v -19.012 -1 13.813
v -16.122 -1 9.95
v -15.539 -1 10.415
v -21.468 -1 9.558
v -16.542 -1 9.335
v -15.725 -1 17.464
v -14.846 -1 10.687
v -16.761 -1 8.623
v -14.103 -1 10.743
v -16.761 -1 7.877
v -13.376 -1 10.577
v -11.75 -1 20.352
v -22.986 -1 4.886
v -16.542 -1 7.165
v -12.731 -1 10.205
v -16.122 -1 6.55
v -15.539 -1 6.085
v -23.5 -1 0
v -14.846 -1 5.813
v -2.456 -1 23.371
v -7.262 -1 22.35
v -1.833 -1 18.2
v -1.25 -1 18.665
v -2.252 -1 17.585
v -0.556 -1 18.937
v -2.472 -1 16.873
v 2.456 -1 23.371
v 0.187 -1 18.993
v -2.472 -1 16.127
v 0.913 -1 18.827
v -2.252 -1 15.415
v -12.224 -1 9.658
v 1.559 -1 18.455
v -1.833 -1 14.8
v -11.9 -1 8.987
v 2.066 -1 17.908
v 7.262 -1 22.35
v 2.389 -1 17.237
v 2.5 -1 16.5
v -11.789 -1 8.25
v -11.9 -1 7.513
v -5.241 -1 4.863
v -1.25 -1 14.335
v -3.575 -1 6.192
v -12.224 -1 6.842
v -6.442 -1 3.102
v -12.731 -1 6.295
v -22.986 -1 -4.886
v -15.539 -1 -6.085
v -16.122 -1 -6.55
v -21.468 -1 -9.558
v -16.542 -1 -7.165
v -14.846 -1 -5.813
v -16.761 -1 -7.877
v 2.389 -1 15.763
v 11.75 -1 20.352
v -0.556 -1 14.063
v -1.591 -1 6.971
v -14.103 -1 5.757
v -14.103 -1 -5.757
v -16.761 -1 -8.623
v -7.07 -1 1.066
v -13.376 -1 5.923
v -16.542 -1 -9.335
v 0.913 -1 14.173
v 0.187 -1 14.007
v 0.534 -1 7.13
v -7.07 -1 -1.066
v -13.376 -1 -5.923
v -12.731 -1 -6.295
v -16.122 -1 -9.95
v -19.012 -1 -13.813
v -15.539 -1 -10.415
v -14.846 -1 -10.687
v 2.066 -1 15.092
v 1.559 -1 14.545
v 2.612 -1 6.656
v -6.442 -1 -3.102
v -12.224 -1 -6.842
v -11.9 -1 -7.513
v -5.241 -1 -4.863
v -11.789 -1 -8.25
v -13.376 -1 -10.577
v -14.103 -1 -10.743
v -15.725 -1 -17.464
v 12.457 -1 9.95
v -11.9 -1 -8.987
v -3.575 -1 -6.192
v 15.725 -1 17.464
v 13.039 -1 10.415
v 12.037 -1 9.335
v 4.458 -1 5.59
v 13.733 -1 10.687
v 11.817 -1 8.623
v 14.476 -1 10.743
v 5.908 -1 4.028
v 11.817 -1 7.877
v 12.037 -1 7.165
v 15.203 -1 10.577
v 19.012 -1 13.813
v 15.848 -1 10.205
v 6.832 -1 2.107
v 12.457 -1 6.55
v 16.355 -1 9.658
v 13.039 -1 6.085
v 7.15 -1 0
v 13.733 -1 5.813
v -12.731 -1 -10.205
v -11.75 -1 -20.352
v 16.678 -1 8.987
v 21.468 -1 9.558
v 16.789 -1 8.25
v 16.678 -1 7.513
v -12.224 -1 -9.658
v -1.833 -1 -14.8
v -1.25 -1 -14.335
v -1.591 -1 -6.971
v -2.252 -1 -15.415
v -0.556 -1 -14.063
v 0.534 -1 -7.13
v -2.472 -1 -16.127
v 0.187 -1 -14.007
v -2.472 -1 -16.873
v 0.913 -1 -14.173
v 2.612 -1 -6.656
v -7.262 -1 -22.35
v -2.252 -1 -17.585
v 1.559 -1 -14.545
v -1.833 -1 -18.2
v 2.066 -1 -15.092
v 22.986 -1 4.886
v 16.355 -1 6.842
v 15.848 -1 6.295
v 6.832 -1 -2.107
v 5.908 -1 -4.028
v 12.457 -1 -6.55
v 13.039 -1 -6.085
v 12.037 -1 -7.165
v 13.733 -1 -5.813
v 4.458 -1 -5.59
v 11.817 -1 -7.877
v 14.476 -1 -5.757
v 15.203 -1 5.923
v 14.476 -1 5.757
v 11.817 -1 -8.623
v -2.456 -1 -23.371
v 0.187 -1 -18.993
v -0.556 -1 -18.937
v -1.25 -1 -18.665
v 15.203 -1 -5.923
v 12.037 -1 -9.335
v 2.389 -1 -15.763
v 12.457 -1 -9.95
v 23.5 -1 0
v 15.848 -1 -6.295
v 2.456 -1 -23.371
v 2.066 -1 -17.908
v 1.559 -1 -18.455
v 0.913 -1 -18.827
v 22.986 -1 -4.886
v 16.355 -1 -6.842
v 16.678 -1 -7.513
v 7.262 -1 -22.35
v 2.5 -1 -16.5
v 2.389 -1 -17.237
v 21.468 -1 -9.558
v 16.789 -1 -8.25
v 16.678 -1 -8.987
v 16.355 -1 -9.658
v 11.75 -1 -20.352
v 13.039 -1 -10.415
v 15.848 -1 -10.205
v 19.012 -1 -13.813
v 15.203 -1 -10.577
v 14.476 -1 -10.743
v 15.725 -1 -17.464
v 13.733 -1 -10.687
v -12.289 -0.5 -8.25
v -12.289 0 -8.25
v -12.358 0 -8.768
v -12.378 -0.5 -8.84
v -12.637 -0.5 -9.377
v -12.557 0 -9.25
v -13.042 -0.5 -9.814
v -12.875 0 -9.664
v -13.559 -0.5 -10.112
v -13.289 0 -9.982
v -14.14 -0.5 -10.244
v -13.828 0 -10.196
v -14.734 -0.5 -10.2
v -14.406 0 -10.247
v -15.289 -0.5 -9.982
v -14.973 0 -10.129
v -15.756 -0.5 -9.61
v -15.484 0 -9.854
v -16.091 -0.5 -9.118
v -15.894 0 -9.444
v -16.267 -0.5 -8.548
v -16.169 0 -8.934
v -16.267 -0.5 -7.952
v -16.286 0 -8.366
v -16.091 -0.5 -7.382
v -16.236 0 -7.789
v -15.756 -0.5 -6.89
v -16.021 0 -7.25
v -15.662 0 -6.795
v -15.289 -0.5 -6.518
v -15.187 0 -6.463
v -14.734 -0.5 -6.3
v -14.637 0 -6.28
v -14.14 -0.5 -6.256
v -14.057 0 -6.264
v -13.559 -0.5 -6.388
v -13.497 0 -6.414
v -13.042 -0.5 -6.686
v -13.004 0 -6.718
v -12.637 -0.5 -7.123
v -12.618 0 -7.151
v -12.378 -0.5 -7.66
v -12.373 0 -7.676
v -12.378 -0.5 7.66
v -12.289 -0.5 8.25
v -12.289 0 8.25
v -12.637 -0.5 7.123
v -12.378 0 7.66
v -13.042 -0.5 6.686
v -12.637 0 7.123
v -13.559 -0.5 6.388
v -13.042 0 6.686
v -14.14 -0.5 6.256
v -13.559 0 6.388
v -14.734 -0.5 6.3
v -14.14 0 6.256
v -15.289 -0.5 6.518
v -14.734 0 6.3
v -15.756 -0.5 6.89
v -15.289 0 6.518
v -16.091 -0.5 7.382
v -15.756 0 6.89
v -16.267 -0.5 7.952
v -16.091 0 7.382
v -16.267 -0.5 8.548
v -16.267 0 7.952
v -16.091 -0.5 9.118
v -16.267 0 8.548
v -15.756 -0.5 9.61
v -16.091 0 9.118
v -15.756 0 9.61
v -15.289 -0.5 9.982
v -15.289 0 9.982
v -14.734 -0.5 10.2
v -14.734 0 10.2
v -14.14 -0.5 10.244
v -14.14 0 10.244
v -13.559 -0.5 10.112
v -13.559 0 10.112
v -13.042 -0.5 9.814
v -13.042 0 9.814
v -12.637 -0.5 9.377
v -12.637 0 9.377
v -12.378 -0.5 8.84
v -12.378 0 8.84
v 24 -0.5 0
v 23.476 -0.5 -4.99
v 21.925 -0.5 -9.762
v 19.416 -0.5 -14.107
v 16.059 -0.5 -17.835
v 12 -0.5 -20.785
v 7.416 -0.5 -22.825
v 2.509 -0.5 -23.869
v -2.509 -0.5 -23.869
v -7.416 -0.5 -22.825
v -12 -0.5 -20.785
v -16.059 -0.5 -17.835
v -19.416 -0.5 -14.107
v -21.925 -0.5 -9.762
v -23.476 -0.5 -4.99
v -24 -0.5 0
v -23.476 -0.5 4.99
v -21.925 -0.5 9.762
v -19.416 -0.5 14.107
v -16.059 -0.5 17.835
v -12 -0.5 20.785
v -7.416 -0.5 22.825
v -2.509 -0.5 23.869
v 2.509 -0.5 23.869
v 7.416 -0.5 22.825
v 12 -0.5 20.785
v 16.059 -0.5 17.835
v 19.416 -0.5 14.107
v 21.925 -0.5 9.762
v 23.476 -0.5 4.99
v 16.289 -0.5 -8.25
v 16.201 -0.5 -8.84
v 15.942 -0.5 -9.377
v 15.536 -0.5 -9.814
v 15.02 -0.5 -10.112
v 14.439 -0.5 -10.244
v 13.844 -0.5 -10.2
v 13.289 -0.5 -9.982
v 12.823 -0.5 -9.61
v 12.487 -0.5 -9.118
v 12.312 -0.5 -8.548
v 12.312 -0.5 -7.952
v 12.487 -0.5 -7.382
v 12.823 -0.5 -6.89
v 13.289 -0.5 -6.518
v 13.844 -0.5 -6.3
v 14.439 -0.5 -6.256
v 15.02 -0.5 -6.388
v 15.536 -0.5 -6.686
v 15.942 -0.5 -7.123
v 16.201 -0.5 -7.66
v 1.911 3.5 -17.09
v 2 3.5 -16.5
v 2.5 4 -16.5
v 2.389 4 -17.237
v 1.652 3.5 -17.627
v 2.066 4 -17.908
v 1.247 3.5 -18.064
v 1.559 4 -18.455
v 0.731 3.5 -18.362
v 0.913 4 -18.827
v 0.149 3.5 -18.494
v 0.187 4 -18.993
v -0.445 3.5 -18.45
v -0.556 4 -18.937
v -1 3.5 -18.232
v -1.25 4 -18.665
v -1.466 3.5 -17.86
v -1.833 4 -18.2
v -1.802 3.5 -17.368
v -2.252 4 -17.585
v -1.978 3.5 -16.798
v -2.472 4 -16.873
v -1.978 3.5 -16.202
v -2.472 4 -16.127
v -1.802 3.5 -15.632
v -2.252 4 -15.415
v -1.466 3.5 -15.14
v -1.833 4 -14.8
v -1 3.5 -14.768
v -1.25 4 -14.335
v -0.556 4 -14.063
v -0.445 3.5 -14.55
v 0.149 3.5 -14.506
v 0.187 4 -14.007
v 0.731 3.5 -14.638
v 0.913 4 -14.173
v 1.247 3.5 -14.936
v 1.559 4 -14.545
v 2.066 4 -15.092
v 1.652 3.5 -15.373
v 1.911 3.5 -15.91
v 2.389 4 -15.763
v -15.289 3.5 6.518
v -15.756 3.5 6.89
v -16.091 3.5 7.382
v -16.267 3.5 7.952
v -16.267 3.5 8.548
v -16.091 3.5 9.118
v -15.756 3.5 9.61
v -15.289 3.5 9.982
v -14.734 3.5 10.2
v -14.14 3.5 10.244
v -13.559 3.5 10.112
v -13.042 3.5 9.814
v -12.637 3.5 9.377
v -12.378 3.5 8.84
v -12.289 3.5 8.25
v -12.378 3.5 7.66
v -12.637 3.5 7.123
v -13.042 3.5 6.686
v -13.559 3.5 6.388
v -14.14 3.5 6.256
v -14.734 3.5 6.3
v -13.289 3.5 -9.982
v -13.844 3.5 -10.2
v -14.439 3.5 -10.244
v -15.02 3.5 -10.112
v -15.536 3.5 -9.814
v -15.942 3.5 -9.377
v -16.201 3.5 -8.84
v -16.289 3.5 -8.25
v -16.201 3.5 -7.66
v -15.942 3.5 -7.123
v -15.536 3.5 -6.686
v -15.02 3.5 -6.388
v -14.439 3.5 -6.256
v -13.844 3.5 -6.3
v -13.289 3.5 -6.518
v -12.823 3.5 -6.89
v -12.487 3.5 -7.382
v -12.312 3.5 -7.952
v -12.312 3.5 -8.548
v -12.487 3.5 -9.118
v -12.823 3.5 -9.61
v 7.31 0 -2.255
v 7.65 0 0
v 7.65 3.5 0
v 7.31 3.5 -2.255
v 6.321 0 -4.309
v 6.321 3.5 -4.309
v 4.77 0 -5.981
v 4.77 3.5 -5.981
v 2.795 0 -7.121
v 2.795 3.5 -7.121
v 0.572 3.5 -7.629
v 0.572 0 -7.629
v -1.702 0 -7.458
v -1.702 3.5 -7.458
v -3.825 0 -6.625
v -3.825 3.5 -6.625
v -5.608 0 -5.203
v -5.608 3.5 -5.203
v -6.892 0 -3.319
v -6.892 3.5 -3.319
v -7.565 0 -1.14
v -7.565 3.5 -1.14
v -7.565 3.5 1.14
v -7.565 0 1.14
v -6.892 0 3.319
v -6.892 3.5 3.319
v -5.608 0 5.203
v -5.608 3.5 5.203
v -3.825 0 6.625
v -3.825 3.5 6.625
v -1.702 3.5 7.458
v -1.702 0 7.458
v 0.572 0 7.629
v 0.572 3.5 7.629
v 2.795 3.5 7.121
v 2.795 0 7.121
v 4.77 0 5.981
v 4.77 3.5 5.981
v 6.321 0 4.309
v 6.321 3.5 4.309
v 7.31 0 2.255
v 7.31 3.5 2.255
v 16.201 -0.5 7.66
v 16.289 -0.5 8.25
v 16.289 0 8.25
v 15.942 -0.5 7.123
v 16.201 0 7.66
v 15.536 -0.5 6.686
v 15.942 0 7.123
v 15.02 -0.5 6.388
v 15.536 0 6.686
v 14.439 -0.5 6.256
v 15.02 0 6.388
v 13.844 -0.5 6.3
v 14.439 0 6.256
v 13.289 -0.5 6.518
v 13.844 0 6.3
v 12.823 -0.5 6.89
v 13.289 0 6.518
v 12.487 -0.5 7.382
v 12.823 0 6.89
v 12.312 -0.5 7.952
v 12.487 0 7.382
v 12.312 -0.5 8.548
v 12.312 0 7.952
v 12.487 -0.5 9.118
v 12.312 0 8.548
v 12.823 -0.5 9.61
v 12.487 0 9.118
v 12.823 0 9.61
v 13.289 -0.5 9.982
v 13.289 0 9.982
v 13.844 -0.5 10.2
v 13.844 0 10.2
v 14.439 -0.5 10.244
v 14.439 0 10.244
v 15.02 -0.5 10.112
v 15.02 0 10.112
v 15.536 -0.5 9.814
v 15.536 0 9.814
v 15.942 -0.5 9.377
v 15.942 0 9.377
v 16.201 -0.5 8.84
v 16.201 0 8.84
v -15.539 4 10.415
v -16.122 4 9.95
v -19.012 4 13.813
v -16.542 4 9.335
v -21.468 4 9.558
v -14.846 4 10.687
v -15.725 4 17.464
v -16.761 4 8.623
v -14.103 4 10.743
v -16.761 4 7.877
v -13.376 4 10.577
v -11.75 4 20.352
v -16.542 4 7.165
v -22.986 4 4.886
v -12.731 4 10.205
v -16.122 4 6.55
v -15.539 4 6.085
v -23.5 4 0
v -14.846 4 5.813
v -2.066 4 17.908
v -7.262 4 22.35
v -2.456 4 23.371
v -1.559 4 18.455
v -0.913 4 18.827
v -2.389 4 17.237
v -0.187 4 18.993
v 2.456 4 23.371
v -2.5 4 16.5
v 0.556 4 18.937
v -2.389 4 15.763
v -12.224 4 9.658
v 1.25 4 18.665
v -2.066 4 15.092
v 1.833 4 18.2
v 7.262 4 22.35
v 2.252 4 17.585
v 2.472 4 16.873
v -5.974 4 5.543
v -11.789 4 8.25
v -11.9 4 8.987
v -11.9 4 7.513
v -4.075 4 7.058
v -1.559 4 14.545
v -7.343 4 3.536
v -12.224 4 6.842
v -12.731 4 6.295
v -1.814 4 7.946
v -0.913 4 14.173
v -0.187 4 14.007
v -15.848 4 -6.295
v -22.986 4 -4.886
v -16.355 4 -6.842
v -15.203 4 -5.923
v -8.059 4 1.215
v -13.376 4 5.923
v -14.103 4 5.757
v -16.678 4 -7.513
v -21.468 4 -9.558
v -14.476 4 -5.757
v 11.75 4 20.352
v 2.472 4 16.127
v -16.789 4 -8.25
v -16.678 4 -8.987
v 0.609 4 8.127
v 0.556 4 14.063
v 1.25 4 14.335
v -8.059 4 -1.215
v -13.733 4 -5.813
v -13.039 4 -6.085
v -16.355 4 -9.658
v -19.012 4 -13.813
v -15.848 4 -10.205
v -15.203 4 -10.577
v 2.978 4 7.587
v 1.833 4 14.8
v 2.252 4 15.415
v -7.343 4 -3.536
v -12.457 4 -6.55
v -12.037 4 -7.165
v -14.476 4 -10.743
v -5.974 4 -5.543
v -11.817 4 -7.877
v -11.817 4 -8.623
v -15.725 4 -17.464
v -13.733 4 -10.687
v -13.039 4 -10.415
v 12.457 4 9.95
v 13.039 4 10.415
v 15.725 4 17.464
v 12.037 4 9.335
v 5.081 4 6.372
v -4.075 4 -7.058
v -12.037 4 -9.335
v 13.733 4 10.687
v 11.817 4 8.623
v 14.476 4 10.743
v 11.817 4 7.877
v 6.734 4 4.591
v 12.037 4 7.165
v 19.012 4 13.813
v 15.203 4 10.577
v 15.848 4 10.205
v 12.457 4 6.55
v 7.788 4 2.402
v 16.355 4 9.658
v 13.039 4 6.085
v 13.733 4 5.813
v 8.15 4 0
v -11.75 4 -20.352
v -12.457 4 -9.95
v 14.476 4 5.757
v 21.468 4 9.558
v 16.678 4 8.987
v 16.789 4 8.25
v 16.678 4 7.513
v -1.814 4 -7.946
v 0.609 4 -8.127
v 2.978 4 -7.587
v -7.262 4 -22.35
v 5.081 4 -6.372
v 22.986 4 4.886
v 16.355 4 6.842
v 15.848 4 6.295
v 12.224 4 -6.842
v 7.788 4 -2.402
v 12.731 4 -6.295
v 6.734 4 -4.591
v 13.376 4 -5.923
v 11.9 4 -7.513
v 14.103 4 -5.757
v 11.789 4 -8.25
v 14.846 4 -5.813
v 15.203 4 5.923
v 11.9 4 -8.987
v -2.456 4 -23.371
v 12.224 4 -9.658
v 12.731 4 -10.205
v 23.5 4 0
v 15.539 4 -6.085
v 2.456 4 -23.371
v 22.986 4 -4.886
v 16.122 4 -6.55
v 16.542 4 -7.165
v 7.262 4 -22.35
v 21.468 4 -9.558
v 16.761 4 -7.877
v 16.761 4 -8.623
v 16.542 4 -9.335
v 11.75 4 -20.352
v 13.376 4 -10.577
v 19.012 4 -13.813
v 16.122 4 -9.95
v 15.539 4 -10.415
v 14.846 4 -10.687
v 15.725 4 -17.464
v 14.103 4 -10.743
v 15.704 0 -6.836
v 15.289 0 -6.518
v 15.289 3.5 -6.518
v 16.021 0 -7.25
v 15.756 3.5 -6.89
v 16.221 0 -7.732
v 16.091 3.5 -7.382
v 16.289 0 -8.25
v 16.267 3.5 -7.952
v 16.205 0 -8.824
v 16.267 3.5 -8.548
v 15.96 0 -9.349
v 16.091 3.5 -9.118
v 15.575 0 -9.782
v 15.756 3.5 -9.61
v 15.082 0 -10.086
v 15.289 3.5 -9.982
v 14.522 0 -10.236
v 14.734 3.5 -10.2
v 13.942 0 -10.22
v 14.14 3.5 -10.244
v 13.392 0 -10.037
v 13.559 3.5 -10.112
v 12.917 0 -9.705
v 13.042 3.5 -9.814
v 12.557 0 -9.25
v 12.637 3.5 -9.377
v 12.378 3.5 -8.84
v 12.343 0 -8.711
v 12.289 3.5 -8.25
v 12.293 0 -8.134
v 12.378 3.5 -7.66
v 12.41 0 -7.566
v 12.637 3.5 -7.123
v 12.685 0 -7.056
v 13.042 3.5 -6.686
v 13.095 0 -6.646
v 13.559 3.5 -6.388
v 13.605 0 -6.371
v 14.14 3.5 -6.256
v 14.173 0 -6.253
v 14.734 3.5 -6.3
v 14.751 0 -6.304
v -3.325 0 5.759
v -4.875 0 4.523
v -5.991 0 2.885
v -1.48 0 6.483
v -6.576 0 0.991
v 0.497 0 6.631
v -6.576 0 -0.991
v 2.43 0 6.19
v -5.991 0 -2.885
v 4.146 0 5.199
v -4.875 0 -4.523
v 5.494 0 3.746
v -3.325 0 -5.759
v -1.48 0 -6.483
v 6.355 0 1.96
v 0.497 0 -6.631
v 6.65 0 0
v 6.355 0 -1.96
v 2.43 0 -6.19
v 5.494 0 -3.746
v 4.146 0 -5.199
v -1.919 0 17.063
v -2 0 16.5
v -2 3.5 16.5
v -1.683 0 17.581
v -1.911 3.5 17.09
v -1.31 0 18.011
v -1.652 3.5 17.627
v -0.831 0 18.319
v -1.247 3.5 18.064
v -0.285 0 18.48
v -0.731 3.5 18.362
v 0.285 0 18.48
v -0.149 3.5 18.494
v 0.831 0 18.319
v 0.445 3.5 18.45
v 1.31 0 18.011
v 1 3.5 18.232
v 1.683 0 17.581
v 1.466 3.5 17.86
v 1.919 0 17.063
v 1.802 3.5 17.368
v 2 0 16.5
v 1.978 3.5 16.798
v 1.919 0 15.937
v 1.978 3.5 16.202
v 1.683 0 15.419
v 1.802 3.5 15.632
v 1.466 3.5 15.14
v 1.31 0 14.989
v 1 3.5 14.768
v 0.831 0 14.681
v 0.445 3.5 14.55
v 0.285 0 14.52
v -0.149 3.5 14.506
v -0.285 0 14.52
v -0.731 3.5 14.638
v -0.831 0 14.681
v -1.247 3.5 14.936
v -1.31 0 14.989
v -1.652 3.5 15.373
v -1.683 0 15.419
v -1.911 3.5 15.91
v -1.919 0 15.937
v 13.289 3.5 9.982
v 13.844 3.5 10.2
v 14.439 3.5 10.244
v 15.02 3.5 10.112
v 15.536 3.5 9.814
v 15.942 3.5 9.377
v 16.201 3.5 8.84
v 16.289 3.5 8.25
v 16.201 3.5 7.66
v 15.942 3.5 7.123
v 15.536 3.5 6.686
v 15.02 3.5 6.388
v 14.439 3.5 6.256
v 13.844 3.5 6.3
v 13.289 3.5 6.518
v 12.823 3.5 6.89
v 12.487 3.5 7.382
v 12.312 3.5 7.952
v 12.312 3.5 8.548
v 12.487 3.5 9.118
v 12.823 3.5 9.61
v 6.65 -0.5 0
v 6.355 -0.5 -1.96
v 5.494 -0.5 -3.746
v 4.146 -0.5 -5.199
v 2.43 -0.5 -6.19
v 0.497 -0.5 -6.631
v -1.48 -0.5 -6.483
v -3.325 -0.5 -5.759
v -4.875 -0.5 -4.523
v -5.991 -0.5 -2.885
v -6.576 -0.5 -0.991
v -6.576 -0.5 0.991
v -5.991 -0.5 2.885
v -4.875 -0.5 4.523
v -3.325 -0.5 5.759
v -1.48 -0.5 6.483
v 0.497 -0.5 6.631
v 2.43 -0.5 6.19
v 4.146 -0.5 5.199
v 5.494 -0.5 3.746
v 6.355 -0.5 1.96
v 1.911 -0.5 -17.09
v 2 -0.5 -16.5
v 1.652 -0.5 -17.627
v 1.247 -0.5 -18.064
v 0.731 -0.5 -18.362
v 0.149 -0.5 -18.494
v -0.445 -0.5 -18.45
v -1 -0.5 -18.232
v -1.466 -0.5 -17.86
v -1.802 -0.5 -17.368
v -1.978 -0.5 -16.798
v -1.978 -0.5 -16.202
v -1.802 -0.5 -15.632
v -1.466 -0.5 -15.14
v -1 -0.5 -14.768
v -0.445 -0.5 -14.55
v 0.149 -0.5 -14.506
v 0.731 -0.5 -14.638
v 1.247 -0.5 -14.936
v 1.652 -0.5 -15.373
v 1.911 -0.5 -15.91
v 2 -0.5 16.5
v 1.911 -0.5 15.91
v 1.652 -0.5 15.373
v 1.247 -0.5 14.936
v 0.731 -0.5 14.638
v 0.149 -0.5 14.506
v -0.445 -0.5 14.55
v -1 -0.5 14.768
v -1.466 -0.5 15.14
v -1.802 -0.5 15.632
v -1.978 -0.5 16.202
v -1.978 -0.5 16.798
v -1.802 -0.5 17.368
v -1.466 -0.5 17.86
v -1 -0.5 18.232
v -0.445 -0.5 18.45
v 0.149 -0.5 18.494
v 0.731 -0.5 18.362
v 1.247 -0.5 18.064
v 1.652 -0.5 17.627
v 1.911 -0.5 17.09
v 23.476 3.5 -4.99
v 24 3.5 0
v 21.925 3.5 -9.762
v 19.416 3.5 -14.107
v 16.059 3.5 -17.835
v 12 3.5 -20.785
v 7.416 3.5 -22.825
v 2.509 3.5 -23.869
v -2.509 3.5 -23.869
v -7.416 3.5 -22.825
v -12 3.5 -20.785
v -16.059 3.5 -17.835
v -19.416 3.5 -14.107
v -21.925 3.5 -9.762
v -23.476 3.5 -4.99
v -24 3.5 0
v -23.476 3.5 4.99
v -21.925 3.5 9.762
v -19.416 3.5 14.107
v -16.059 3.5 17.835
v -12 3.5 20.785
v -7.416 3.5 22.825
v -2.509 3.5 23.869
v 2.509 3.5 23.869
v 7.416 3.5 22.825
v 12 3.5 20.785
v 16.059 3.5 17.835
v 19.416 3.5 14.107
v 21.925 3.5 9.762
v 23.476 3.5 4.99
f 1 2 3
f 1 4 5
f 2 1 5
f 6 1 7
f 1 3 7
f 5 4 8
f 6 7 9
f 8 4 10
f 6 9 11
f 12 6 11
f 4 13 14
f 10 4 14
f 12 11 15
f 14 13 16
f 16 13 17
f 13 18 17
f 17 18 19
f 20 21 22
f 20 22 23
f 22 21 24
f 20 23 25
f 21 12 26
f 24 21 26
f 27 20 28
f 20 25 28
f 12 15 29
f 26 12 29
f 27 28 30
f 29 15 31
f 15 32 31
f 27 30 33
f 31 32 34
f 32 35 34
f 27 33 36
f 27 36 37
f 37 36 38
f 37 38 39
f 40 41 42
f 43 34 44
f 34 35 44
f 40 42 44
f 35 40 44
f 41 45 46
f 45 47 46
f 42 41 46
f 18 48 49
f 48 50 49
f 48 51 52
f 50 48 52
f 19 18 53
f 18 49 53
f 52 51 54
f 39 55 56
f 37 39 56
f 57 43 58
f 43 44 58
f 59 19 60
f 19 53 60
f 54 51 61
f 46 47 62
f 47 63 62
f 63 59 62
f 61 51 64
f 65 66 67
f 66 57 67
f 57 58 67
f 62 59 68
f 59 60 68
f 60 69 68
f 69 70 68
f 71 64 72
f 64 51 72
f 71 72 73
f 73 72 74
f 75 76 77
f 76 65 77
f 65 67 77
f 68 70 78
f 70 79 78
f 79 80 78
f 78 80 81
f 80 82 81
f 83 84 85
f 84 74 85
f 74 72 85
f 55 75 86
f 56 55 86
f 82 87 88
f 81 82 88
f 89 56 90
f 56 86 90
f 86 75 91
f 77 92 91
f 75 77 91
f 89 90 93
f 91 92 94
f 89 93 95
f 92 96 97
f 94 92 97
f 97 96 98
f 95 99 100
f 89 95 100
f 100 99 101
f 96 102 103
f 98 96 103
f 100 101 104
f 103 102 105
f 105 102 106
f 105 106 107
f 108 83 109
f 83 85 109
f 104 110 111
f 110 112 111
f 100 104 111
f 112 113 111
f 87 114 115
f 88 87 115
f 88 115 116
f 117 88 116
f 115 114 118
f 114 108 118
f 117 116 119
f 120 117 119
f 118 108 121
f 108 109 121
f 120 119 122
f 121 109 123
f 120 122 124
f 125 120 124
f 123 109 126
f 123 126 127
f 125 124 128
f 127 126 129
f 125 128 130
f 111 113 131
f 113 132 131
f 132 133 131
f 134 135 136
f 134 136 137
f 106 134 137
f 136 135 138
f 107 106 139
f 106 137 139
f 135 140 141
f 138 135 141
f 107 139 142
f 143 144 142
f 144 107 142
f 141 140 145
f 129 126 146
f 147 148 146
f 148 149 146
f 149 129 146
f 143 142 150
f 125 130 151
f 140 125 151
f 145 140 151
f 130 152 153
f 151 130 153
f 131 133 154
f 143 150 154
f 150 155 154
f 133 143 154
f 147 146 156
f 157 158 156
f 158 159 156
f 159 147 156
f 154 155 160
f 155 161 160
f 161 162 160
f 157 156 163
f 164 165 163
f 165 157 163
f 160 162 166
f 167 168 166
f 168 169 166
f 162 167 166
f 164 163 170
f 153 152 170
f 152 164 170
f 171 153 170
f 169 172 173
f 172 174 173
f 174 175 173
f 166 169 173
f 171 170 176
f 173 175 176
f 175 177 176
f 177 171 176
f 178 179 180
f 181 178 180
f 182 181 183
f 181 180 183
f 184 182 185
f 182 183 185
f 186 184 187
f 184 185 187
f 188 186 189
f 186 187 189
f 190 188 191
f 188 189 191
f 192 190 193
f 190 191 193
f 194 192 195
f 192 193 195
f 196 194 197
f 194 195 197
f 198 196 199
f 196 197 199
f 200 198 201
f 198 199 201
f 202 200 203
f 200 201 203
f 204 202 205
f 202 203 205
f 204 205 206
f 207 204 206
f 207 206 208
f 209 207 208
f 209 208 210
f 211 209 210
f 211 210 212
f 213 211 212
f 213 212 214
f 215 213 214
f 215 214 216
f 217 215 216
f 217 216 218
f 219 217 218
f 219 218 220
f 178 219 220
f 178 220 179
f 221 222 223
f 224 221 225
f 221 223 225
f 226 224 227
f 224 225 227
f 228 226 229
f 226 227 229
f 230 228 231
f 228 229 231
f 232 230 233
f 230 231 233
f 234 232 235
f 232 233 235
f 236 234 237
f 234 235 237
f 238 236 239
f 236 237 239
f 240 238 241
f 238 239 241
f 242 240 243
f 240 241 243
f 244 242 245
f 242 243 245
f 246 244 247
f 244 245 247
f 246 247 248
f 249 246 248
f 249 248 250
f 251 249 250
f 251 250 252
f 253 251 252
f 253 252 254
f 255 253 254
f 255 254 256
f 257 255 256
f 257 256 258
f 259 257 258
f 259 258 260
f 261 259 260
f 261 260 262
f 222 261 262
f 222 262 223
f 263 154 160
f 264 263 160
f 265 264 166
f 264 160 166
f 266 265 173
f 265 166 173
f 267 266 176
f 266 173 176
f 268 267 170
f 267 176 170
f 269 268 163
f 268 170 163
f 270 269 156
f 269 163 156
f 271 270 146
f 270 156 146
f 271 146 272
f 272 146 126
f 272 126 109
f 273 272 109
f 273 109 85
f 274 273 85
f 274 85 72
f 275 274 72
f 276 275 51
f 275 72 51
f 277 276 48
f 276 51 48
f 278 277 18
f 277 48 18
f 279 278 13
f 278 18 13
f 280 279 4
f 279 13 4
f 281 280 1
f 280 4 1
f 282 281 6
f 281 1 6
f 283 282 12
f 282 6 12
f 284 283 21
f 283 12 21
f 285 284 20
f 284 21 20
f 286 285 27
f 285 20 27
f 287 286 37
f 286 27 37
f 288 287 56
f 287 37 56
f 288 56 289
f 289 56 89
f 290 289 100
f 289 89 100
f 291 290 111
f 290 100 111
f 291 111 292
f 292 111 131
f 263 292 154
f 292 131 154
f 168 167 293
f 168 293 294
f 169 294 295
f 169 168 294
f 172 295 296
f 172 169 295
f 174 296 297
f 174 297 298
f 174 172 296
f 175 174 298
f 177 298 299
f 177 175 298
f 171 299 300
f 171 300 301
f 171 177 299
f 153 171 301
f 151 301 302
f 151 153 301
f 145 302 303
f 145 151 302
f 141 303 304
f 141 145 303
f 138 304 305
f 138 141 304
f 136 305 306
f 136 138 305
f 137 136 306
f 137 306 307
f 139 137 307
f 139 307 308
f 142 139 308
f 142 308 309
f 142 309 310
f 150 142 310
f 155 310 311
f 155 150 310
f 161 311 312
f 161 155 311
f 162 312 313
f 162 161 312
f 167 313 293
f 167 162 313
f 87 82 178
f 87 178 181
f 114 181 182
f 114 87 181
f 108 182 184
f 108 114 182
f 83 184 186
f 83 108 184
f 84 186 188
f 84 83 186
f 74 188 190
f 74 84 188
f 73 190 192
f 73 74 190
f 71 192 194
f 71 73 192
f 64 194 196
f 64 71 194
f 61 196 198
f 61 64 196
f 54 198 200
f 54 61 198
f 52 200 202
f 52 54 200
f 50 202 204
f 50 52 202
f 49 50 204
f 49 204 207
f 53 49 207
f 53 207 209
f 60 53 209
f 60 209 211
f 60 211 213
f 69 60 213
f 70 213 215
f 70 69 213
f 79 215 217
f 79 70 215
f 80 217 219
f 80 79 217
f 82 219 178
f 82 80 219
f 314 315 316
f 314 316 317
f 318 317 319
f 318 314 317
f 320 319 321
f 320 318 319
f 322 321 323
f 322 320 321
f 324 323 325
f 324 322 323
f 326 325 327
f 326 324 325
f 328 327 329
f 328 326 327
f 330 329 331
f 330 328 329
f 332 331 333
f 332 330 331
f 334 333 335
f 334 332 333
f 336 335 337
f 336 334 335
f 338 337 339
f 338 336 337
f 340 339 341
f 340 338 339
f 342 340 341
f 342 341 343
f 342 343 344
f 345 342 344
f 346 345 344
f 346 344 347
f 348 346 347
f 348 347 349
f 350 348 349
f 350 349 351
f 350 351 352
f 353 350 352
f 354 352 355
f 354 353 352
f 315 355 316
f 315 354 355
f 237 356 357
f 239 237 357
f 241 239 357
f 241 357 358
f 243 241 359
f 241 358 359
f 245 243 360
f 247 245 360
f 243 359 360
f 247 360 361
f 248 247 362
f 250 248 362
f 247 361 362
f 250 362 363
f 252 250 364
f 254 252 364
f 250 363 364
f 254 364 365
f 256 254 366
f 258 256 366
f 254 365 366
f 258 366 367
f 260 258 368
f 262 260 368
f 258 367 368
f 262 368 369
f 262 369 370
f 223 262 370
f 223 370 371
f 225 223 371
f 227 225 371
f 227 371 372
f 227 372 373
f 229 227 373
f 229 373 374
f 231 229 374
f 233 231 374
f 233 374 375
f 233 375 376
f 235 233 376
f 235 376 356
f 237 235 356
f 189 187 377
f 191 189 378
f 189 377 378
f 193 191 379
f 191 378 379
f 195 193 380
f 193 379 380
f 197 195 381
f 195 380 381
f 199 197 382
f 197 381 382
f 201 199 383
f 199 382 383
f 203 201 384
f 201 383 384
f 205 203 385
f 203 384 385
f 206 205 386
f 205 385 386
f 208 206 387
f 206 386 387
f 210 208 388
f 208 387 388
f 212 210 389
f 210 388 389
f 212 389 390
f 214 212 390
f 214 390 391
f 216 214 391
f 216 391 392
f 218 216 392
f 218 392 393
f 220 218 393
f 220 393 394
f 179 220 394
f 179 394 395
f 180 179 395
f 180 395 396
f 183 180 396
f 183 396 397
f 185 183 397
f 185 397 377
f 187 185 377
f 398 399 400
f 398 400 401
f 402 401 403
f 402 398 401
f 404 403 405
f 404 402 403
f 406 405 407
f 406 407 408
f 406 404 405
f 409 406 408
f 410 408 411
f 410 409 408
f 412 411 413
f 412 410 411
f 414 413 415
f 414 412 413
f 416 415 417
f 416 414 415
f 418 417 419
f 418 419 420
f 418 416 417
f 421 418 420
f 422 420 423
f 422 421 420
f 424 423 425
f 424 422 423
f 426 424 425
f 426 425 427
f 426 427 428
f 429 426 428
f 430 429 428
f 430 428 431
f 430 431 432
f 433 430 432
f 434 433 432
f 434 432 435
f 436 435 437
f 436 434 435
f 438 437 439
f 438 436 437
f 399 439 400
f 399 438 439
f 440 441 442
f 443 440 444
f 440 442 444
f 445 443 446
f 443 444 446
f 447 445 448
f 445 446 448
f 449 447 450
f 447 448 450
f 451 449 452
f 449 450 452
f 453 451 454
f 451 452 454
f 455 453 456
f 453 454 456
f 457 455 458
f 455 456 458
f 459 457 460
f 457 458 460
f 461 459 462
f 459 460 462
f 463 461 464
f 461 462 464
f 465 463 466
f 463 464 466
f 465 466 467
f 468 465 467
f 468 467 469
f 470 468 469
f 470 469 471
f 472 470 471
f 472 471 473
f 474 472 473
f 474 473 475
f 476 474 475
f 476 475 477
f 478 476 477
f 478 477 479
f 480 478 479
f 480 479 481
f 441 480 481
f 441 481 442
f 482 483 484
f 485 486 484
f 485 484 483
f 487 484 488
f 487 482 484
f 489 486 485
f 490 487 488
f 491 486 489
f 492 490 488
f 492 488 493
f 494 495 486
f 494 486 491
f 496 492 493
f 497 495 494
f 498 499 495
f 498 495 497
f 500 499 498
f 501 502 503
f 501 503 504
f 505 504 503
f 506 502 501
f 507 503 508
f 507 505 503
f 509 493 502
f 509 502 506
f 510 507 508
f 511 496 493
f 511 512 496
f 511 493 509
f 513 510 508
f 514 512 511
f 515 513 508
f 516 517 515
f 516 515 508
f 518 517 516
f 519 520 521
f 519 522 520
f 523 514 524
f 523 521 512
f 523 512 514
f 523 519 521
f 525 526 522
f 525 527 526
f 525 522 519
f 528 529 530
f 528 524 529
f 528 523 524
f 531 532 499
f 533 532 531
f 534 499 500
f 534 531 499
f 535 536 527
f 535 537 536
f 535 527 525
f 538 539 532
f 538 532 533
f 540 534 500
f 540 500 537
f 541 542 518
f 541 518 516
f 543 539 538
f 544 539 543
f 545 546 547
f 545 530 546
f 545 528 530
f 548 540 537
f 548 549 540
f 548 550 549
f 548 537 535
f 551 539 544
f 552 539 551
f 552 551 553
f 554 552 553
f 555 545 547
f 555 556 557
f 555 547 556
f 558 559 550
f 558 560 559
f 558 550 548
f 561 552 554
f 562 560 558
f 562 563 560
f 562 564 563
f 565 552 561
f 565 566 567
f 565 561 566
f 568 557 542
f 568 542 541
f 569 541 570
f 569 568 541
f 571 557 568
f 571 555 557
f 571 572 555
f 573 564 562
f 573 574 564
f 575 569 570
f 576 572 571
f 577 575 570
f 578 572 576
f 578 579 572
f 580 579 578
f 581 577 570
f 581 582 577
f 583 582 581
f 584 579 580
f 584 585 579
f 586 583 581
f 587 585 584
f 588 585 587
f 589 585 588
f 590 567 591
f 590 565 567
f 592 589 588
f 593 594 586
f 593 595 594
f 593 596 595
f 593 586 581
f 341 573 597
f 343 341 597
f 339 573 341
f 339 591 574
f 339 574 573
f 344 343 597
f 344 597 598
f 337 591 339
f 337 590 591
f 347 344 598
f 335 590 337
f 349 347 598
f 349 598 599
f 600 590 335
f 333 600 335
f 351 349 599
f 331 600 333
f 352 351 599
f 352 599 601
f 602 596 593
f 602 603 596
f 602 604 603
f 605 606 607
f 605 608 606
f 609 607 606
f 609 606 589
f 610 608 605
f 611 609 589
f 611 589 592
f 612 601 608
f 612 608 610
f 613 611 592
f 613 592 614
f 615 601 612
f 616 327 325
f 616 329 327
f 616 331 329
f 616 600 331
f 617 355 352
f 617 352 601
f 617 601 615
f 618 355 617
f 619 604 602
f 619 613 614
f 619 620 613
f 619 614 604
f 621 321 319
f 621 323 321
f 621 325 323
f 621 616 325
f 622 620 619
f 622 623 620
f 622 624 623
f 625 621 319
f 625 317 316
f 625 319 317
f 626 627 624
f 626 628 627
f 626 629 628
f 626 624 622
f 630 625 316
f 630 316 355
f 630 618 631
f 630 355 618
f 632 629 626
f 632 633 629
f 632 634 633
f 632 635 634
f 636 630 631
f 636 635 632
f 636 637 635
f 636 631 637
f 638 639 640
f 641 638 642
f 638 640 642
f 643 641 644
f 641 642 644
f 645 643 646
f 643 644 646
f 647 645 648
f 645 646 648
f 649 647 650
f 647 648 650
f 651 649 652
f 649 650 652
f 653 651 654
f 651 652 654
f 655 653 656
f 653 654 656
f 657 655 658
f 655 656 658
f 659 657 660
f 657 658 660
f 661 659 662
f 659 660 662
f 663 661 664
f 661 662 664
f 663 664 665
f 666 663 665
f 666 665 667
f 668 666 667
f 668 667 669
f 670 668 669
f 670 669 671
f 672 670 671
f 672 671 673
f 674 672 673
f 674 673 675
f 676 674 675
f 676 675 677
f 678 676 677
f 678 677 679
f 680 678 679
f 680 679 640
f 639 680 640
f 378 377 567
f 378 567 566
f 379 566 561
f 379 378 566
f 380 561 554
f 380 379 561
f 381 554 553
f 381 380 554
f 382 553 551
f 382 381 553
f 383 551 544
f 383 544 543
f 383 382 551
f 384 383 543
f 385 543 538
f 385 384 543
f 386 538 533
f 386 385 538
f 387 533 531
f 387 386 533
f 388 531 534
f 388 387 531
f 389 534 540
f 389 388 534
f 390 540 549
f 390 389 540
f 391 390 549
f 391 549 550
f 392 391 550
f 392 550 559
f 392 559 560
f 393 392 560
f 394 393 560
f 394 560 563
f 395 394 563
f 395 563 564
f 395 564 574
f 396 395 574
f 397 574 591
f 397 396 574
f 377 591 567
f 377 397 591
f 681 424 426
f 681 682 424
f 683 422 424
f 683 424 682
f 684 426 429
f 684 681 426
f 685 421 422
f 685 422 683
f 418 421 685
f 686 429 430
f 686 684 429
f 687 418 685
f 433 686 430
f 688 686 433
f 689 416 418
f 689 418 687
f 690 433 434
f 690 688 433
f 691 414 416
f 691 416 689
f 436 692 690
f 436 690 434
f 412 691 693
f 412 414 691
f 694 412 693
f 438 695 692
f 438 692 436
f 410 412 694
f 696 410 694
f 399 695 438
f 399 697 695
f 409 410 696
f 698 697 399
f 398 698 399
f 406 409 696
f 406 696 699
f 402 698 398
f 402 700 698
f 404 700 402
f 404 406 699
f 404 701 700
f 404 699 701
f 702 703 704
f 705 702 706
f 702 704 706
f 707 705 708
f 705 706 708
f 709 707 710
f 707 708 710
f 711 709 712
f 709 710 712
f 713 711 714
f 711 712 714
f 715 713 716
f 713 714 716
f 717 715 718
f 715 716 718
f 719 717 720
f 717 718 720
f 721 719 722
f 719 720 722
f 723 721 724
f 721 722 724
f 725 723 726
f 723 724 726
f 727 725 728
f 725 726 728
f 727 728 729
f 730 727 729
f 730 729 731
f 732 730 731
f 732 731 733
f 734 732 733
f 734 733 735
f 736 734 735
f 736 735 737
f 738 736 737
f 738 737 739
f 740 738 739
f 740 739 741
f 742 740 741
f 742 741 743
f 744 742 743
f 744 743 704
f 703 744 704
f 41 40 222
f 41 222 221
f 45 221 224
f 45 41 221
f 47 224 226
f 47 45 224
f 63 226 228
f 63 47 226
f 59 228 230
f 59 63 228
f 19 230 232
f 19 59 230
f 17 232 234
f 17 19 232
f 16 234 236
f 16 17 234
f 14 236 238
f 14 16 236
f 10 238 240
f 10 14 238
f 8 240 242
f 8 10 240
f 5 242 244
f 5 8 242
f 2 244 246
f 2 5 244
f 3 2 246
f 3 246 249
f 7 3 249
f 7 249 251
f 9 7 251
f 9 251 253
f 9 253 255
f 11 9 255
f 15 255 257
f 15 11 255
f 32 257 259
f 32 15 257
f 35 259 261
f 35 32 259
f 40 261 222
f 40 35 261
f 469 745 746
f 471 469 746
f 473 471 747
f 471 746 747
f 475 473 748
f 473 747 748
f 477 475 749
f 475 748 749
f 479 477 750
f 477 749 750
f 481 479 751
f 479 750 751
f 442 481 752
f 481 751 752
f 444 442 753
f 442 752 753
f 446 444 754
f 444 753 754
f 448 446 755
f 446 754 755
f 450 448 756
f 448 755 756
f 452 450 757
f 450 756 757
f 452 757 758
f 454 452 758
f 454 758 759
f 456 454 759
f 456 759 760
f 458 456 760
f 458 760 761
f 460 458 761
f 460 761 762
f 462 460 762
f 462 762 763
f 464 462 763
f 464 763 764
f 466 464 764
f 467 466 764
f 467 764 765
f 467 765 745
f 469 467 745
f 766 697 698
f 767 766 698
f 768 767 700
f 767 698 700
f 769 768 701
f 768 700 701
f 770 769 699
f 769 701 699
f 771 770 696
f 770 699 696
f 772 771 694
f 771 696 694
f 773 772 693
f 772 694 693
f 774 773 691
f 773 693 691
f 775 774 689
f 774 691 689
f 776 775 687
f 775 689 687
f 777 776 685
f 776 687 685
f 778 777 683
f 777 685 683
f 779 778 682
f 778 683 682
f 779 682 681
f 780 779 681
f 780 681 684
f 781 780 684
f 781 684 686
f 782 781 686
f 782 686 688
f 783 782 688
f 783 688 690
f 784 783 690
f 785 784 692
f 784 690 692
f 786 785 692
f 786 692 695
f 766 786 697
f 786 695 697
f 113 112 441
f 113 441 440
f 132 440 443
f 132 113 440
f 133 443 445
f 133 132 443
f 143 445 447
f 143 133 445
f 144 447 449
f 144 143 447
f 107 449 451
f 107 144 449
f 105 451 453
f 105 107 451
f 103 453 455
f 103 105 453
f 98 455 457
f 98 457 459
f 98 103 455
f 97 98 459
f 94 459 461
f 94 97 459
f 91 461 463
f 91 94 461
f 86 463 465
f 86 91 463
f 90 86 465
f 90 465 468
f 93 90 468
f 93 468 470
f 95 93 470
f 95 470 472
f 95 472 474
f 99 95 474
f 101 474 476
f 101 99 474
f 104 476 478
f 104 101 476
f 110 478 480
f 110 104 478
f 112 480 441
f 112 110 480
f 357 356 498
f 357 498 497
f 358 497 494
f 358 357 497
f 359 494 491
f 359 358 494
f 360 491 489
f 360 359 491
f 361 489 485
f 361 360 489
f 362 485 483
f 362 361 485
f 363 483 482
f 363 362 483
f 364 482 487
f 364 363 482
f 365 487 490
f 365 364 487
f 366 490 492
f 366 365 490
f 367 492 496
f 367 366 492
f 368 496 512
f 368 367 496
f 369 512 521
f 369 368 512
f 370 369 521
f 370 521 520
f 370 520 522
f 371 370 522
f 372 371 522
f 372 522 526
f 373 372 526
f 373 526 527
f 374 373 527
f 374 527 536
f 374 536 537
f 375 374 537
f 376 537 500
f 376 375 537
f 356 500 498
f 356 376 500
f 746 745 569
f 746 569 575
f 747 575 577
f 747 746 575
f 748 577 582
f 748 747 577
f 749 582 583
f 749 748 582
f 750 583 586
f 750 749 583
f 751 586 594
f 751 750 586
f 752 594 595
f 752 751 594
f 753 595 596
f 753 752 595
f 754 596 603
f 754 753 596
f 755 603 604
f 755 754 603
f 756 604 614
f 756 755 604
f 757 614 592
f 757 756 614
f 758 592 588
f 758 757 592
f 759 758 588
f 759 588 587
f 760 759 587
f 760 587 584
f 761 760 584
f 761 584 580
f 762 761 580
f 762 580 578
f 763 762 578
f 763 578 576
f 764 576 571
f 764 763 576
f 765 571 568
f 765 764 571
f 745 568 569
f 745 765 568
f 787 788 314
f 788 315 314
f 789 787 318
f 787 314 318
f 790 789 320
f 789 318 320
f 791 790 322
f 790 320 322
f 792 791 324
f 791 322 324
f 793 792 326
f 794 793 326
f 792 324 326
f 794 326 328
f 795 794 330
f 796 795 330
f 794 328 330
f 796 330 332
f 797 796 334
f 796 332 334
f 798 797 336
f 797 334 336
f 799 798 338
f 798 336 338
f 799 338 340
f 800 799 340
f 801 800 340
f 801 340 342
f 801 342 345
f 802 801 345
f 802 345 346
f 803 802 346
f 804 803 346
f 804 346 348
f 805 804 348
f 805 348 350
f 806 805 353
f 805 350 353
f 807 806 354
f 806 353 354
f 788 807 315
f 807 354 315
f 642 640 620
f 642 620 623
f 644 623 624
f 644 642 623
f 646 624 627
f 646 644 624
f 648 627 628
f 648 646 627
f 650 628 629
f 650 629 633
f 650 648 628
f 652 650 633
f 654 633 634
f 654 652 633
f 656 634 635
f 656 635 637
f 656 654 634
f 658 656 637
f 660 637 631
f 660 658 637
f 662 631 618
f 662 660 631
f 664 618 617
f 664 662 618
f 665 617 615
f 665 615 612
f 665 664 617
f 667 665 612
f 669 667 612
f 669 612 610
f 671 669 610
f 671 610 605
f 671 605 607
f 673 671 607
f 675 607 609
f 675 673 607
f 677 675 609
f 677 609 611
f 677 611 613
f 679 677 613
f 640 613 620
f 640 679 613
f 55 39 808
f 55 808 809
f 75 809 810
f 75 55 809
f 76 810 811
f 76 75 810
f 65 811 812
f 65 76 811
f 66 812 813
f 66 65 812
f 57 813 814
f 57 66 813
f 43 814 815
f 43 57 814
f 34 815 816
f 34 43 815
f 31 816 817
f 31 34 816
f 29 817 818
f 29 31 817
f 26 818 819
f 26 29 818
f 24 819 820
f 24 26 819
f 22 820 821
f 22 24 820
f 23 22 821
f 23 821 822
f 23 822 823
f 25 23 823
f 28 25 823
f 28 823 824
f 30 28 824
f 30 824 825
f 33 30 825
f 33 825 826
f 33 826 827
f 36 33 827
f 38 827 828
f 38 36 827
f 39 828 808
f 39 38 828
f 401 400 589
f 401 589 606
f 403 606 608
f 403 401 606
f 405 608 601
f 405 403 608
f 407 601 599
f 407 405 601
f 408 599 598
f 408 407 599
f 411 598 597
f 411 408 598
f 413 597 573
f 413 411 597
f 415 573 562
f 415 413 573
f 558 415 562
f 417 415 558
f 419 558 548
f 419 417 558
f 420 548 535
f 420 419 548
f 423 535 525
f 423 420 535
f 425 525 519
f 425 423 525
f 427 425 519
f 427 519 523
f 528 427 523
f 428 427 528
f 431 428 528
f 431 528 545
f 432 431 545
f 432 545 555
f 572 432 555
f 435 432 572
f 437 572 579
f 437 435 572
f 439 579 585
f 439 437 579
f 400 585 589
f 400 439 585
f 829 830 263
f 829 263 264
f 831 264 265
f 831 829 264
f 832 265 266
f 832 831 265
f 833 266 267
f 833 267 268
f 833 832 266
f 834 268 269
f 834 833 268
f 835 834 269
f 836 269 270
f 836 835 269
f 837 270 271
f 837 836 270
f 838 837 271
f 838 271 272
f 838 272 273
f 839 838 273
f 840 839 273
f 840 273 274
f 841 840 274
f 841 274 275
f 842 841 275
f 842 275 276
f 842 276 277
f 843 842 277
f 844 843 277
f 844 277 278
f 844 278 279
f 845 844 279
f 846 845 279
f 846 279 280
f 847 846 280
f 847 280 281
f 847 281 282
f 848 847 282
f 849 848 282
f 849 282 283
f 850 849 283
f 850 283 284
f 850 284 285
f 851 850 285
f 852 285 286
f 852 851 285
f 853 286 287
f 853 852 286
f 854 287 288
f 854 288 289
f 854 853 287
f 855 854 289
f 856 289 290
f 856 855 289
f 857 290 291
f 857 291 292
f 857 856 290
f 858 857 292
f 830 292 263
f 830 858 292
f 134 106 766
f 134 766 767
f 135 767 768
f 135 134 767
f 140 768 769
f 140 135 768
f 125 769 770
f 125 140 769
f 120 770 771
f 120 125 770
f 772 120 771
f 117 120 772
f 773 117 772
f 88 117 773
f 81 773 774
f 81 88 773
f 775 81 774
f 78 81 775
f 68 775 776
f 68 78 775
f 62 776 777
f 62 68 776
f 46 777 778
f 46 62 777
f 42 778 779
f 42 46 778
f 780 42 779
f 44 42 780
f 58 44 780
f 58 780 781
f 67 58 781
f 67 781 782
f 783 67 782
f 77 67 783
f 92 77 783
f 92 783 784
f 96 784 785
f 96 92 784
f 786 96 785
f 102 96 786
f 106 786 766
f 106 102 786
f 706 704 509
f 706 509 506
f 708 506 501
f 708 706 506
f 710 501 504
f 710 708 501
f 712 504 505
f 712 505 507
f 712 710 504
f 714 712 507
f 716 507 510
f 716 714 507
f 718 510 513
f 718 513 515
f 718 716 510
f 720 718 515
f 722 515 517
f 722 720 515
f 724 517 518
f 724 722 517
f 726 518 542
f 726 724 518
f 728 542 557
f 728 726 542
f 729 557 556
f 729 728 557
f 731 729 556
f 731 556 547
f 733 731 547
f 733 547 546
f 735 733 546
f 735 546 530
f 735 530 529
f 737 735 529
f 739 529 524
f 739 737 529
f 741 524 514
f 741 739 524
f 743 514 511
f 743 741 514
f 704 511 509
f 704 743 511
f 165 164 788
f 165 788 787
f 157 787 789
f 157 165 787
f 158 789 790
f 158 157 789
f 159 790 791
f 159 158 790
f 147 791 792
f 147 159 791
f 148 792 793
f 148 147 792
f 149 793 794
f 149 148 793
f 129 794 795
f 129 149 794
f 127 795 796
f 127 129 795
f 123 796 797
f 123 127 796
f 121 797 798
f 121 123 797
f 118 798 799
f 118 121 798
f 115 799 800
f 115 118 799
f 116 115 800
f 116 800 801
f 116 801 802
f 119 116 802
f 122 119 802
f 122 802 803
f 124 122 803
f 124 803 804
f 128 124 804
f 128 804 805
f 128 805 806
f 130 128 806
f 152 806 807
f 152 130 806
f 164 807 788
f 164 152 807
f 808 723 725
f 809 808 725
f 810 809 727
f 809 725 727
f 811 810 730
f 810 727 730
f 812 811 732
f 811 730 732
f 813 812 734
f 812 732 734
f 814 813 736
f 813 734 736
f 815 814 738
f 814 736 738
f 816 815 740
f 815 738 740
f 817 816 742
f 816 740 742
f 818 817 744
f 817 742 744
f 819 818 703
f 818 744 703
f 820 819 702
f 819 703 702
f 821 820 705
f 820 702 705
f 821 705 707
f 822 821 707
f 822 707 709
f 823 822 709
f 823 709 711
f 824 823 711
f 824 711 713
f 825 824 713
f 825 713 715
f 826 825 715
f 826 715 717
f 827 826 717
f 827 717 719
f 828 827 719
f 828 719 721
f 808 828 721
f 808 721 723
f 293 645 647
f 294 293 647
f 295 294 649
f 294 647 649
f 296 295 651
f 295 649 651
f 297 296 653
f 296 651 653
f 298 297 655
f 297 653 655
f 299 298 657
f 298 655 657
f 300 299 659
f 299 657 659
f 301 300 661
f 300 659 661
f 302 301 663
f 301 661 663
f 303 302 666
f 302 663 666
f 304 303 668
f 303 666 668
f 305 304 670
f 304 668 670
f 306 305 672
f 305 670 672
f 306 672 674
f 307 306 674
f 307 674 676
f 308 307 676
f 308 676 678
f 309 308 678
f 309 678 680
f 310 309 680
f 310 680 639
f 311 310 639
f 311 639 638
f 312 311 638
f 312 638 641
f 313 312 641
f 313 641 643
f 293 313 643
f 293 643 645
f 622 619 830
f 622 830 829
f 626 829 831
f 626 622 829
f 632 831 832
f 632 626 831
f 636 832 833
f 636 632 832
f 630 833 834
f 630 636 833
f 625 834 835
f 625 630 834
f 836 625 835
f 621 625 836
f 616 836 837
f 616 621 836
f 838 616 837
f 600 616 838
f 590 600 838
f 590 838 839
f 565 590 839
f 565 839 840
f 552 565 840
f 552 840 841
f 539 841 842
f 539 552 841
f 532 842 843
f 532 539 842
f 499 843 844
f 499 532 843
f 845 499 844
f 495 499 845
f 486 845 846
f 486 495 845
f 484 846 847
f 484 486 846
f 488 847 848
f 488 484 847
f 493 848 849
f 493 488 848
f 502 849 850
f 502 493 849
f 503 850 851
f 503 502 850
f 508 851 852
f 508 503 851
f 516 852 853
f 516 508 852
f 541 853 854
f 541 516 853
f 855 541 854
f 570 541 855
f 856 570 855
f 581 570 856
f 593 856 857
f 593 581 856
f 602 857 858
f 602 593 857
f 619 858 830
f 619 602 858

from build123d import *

# Parameters (mm, degrees)
SKETCH1_R           = 24
SKETCH1_R_2         = 7.65
BOSS_EXTRUDE1_DEPTH = 4
SKETCH2_R           = 2
CUT_EXTRUDE1_DEPTH  = 5
CIRPATTERN2_COUNT   = 6
SKETCH3_R           = 24
SKETCH3_R_2         = 6.65
SKETCH3_R_3         = 2
BOSS_EXTRUDE2_DEPTH = 1
CHAMFER1_SIZE       = 0.5


with BuildPart() as part:
    # Sketch1 → Boss-Extrude1 (new body)
    with BuildSketch(Plane(origin=(0, 0, 0), x_dir=(1, 0, 0), z_dir=(0, 1, 0))):
        Circle(SKETCH1_R)
        Circle(SKETCH1_R_2, mode=Mode.SUBTRACT)
    extrude(amount=BOSS_EXTRUDE1_DEPTH)

    # Sketch2 → Cut-Extrude1 (cut, through all)
    with BuildSketch(Plane(origin=(0, 4, 0), x_dir=(1, 0, 0), z_dir=(0, 1, 0))):
        with Locations((0, 16.5)):
            Circle(SKETCH2_R)
    cut_extrude1 = extrude(amount=-CUT_EXTRUDE1_DEPTH, mode=Mode.SUBTRACT)

    # CirPattern2: Cut-Extrude1 ×6 about axis
    cirpattern2_axis = Axis((0, 0, 0), (0, 1, 0))
    for i in range(1, CIRPATTERN2_COUNT):
        add(cut_extrude1.rotate(cirpattern2_axis, i * 360 / CIRPATTERN2_COUNT), mode=Mode.SUBTRACT)

    # Sketch3 → Boss-Extrude2 (add)
    with BuildSketch(Plane(origin=(0, 0, 0), x_dir=(1, 0, 0), z_dir=(0, 1, 0))):
        Circle(SKETCH3_R)
        Circle(SKETCH3_R_2, mode=Mode.SUBTRACT)
        with Locations((-14.289419, -8.25)):
            Circle(SKETCH3_R_3, mode=Mode.SUBTRACT)
        with Locations((0, -16.5)):
            Circle(SKETCH3_R_3, mode=Mode.SUBTRACT)
        with Locations((14.289419, -8.25)):
            Circle(SKETCH3_R_3, mode=Mode.SUBTRACT)
        with Locations((14.289419, 8.25)):
            Circle(SKETCH3_R_3, mode=Mode.SUBTRACT)
        with Locations((0, 16.5)):
            Circle(SKETCH3_R_3, mode=Mode.SUBTRACT)
        with Locations((-14.289419, 8.25)):
            Circle(SKETCH3_R_3, mode=Mode.SUBTRACT)
    extrude(amount=-BOSS_EXTRUDE2_DEPTH)

    # Chamfer1
    chamfer1_edges = [part.edges().sort_by_distance(p)[0] for p in [
        (-2, 4, -16.5),
        (13.289419, 4, -9.982051),
        (15.289419, 4, 6.517949),
        (2, 4, 16.5),
        (-13.289419, 4, 9.982051),
        (-15.289419, 4, -6.517949),
        (-24, -1, 0),
        (-16.289419, -1, -8.25),
        (-2, -1, -16.5),
        (12.289419, -1, -8.25),
        (12.289419, -1, 8.25),
        (-2, -1, 16.5),
        (-6.65, -1, 0),
        (-16.289419, -1, 8.25),
        (-24, 4, 0),
        (-7.65, 4, 0),
    ]]
    chamfer(chamfer1_edges, length=CHAMFER1_SIZE)


solid = part.part
